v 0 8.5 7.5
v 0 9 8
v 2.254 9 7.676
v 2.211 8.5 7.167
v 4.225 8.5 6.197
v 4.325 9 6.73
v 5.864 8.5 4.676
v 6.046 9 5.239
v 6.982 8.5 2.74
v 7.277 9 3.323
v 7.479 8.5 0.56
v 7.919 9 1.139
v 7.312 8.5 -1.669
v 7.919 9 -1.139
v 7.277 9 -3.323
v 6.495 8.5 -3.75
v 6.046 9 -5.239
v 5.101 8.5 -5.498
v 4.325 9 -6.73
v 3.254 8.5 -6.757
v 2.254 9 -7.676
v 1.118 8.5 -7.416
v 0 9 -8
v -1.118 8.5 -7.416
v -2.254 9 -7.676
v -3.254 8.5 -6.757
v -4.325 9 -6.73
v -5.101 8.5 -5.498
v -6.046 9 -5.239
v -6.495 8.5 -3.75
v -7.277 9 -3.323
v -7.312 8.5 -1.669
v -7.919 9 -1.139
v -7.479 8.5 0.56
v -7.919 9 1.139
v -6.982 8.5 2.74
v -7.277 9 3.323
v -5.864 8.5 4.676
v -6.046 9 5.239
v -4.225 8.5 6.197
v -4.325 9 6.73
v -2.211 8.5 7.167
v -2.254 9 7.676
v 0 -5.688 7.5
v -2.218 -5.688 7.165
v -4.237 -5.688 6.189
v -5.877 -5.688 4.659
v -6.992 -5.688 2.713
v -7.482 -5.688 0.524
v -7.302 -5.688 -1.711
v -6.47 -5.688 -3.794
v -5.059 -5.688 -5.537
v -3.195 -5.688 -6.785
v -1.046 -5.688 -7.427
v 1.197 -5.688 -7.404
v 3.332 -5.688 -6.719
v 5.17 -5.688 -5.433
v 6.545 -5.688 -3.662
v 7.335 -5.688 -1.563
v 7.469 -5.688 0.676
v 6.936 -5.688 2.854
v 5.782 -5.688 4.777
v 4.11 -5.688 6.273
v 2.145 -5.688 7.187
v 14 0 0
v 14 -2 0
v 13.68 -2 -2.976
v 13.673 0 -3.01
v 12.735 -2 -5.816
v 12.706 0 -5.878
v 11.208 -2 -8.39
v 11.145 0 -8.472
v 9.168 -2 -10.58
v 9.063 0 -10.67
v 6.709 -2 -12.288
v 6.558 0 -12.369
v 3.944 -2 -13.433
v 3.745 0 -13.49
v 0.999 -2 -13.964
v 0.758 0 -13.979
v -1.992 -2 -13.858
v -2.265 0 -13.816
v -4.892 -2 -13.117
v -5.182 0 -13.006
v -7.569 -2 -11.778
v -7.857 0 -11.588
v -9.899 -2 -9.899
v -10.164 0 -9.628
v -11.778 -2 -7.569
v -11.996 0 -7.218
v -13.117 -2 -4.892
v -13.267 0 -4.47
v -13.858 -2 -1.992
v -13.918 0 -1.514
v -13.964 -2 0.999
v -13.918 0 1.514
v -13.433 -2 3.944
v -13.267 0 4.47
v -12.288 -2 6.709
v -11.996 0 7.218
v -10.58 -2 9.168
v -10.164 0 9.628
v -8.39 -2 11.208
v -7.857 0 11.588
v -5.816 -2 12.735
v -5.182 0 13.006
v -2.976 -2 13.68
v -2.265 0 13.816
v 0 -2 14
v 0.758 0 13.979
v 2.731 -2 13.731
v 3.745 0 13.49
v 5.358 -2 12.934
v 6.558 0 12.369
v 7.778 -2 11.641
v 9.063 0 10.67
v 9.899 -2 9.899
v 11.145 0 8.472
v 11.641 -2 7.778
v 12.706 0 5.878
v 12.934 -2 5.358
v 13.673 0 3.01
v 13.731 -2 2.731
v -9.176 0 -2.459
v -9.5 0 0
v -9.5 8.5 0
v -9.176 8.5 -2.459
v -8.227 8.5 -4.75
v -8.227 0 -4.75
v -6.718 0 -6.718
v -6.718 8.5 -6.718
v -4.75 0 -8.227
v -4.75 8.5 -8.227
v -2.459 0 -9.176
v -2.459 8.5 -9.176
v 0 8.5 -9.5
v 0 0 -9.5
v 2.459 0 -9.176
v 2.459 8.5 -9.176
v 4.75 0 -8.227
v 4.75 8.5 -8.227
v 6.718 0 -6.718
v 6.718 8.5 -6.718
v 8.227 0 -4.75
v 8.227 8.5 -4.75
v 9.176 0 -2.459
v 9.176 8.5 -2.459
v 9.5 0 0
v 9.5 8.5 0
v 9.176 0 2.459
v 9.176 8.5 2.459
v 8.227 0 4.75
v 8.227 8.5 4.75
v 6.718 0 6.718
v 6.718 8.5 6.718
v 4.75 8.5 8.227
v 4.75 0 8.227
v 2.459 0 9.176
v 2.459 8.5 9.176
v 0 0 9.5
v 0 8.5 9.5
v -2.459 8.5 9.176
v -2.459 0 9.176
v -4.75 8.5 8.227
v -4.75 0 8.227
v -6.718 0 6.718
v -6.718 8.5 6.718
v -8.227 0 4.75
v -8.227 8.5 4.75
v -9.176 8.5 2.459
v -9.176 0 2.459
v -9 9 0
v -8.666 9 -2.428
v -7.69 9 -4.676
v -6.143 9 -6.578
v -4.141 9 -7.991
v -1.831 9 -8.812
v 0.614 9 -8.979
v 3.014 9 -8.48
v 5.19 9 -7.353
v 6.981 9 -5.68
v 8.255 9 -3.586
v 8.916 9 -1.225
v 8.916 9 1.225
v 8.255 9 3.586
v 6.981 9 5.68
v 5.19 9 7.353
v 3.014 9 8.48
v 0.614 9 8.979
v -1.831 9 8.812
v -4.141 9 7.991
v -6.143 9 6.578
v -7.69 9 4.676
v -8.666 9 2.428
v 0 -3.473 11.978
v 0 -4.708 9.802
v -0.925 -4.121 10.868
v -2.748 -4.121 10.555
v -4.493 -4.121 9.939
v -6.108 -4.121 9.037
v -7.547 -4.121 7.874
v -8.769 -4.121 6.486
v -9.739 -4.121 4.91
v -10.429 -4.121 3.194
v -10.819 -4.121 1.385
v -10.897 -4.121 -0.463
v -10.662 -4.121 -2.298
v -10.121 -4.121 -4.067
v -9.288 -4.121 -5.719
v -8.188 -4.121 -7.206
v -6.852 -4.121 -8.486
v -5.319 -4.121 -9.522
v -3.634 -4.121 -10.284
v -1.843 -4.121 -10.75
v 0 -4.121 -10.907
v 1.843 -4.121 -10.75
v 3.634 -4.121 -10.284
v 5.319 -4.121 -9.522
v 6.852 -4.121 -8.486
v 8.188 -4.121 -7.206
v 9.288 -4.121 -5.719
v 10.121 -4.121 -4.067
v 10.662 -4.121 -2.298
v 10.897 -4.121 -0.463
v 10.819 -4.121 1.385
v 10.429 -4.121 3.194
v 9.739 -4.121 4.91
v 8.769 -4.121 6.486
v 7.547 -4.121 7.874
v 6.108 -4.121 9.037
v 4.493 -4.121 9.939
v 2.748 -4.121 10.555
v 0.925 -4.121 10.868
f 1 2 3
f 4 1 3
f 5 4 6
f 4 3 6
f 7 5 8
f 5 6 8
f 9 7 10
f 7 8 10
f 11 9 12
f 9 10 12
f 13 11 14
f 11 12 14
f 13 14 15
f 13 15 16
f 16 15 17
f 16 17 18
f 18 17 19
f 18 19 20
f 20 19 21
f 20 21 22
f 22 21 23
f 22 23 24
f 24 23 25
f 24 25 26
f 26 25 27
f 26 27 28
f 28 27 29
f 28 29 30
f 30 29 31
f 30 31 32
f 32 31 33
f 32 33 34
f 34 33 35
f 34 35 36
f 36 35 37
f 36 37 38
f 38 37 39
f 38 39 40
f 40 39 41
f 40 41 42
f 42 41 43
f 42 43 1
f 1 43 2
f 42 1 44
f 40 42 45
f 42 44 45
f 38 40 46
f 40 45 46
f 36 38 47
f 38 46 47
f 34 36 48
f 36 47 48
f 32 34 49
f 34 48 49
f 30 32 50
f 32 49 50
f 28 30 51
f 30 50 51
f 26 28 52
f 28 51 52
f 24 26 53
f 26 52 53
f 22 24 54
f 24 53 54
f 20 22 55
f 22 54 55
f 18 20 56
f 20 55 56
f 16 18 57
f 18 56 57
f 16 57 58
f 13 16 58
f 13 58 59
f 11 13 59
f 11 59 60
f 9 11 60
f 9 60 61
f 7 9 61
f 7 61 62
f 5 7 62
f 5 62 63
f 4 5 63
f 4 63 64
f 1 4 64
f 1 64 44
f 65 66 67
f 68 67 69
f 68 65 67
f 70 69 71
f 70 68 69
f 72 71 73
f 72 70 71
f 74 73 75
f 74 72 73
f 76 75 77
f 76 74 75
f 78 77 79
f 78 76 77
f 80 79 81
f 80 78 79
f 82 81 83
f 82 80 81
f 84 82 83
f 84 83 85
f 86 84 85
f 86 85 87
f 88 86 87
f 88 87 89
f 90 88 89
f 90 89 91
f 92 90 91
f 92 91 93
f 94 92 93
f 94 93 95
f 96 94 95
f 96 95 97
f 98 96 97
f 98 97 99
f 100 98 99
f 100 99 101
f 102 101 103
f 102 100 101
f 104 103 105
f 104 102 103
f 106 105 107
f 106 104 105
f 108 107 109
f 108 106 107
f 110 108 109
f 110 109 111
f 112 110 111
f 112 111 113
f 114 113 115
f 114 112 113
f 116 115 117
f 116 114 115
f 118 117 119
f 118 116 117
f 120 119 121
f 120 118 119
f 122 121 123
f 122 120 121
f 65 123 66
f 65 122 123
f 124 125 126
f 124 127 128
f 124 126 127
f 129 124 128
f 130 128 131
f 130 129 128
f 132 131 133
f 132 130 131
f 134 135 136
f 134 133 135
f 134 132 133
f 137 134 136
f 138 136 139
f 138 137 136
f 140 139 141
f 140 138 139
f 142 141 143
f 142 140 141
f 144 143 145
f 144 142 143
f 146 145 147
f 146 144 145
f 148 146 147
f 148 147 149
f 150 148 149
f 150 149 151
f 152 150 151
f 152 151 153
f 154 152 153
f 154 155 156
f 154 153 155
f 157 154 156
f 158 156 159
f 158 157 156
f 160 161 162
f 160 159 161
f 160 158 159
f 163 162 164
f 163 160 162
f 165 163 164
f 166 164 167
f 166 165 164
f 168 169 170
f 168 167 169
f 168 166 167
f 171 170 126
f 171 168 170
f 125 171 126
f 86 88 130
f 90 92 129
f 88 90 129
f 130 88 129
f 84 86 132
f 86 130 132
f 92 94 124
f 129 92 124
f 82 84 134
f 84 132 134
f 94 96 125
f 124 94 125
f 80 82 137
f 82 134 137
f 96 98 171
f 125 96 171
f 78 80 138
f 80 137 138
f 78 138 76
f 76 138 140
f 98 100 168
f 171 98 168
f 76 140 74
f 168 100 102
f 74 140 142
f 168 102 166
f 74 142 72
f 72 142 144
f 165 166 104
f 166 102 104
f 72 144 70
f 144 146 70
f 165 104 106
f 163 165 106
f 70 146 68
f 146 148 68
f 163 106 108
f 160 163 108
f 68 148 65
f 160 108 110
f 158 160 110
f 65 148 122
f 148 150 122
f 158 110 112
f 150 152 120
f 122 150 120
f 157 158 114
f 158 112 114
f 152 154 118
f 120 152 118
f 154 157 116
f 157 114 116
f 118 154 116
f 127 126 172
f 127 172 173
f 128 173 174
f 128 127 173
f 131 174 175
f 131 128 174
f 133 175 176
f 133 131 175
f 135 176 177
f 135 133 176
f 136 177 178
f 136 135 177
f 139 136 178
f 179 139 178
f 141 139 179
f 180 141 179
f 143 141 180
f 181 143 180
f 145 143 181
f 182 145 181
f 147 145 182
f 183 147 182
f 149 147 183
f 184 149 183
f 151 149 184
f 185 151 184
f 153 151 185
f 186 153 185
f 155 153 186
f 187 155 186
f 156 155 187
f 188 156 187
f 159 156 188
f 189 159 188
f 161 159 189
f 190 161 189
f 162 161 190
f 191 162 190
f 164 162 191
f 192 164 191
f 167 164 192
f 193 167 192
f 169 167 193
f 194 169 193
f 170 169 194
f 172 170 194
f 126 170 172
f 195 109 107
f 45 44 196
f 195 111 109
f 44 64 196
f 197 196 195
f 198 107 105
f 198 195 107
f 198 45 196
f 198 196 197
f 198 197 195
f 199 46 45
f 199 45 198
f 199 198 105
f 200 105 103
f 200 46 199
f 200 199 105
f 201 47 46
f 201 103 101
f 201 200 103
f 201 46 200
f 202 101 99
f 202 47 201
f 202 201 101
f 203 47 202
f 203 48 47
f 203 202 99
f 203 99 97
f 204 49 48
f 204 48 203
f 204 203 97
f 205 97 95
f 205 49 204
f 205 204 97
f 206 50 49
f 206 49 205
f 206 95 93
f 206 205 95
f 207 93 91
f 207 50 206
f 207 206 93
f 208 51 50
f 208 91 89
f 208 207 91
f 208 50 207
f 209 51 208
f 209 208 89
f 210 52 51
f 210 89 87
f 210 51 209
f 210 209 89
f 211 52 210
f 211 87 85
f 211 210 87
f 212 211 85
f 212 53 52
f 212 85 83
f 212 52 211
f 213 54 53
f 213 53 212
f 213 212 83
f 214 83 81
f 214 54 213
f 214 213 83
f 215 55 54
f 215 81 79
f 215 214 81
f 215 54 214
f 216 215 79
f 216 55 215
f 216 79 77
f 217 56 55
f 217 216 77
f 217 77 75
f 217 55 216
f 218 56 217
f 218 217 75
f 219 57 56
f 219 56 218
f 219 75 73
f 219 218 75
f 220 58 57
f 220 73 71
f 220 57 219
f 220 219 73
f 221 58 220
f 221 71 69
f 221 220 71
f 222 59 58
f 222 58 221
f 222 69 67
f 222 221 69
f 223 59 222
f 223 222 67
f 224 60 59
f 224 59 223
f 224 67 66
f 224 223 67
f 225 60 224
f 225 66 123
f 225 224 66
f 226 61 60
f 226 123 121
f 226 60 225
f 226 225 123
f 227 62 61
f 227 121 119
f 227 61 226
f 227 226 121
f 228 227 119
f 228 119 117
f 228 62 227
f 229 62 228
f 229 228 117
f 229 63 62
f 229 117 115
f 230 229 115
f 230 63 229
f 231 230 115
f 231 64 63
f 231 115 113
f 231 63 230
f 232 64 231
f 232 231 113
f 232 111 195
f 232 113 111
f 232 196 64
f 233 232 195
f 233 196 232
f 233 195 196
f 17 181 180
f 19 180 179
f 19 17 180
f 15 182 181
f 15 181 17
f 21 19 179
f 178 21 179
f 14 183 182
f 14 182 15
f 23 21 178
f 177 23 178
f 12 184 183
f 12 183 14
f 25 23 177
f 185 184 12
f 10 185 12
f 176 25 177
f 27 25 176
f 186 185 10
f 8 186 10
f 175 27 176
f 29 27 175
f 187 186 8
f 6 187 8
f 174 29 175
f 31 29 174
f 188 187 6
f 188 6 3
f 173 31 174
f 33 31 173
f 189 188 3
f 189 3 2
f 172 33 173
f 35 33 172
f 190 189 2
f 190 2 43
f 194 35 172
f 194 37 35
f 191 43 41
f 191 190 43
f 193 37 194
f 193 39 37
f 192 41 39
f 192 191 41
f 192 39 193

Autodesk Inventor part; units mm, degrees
ref_plane "YZ Plane" through (0, 0, 0) normal (1, 0, 0) x (0, 1, 0)
ref_plane "XZ Plane" through (0, 0, 0) normal (0, 1, 0) x (-1, 0, 0)
ref_plane "XY Plane" through (0, 0, 0) normal (0, 0, 1) x (1, 0, 0)
sketch "Sketch1" plane through (0, 0, 0) normal (0, 1, 0) x (-1, 0, 0)
  circle A0 centre (0, 0) radius 9.5
  dimension "d0" = 19
extrude "Extrusion1" add sketch "Sketch1" along normal blind 9
sketch "Sketch2" plane through (0, 0, 0) normal (0, -1, 0) x (1, 0, 0)
  circle A0 centre (0, 0) radius 14
  dimension "d3" = 28
extrude "Extrusion2" add sketch "Sketch2" along normal blind 2
sketch "Sketch5" plane through (0, 0, 0) normal (1, 0, 0) x (0, 1, 0)
  line L0 (-2, 14) -> (-2, -14) construction
  line L1 (-2, 0) -> (-2, 14)
  line L2 (-2, 0) -> (-7, 0)
  circle A0 centre (15.1, 0) radius 22.1 construction
  line L3 (-19.5566, 0) -> (77.1483, 0) projected
  arc A1 (-2, 14) -> (-7, 0) centre (15.1, 0) ccw
  point P0 (0, 0)
  dimension "d13" = 5
revolve "Revolution1" add sketch "Sketch5" angle 360 about axis through (0, -10, 0) along (0, 1, 0)
sketch "Sketch6" plane through (0, 9, 0) normal (0, 1, 0) x (1, 0, 0)
  point P0 (0, 0)
  point P1 (0, 0)
hole "Hole2" at (0, 9, 0) direction (0, -1, 0) diameter 15 end through all
chamfer "Chamfer2" distance 0.5 angle 45 2 edges at (9.5, 9, 0) (0, 9, -7.5)
properties part number "KN-00-02-06" material "CuZn40"
